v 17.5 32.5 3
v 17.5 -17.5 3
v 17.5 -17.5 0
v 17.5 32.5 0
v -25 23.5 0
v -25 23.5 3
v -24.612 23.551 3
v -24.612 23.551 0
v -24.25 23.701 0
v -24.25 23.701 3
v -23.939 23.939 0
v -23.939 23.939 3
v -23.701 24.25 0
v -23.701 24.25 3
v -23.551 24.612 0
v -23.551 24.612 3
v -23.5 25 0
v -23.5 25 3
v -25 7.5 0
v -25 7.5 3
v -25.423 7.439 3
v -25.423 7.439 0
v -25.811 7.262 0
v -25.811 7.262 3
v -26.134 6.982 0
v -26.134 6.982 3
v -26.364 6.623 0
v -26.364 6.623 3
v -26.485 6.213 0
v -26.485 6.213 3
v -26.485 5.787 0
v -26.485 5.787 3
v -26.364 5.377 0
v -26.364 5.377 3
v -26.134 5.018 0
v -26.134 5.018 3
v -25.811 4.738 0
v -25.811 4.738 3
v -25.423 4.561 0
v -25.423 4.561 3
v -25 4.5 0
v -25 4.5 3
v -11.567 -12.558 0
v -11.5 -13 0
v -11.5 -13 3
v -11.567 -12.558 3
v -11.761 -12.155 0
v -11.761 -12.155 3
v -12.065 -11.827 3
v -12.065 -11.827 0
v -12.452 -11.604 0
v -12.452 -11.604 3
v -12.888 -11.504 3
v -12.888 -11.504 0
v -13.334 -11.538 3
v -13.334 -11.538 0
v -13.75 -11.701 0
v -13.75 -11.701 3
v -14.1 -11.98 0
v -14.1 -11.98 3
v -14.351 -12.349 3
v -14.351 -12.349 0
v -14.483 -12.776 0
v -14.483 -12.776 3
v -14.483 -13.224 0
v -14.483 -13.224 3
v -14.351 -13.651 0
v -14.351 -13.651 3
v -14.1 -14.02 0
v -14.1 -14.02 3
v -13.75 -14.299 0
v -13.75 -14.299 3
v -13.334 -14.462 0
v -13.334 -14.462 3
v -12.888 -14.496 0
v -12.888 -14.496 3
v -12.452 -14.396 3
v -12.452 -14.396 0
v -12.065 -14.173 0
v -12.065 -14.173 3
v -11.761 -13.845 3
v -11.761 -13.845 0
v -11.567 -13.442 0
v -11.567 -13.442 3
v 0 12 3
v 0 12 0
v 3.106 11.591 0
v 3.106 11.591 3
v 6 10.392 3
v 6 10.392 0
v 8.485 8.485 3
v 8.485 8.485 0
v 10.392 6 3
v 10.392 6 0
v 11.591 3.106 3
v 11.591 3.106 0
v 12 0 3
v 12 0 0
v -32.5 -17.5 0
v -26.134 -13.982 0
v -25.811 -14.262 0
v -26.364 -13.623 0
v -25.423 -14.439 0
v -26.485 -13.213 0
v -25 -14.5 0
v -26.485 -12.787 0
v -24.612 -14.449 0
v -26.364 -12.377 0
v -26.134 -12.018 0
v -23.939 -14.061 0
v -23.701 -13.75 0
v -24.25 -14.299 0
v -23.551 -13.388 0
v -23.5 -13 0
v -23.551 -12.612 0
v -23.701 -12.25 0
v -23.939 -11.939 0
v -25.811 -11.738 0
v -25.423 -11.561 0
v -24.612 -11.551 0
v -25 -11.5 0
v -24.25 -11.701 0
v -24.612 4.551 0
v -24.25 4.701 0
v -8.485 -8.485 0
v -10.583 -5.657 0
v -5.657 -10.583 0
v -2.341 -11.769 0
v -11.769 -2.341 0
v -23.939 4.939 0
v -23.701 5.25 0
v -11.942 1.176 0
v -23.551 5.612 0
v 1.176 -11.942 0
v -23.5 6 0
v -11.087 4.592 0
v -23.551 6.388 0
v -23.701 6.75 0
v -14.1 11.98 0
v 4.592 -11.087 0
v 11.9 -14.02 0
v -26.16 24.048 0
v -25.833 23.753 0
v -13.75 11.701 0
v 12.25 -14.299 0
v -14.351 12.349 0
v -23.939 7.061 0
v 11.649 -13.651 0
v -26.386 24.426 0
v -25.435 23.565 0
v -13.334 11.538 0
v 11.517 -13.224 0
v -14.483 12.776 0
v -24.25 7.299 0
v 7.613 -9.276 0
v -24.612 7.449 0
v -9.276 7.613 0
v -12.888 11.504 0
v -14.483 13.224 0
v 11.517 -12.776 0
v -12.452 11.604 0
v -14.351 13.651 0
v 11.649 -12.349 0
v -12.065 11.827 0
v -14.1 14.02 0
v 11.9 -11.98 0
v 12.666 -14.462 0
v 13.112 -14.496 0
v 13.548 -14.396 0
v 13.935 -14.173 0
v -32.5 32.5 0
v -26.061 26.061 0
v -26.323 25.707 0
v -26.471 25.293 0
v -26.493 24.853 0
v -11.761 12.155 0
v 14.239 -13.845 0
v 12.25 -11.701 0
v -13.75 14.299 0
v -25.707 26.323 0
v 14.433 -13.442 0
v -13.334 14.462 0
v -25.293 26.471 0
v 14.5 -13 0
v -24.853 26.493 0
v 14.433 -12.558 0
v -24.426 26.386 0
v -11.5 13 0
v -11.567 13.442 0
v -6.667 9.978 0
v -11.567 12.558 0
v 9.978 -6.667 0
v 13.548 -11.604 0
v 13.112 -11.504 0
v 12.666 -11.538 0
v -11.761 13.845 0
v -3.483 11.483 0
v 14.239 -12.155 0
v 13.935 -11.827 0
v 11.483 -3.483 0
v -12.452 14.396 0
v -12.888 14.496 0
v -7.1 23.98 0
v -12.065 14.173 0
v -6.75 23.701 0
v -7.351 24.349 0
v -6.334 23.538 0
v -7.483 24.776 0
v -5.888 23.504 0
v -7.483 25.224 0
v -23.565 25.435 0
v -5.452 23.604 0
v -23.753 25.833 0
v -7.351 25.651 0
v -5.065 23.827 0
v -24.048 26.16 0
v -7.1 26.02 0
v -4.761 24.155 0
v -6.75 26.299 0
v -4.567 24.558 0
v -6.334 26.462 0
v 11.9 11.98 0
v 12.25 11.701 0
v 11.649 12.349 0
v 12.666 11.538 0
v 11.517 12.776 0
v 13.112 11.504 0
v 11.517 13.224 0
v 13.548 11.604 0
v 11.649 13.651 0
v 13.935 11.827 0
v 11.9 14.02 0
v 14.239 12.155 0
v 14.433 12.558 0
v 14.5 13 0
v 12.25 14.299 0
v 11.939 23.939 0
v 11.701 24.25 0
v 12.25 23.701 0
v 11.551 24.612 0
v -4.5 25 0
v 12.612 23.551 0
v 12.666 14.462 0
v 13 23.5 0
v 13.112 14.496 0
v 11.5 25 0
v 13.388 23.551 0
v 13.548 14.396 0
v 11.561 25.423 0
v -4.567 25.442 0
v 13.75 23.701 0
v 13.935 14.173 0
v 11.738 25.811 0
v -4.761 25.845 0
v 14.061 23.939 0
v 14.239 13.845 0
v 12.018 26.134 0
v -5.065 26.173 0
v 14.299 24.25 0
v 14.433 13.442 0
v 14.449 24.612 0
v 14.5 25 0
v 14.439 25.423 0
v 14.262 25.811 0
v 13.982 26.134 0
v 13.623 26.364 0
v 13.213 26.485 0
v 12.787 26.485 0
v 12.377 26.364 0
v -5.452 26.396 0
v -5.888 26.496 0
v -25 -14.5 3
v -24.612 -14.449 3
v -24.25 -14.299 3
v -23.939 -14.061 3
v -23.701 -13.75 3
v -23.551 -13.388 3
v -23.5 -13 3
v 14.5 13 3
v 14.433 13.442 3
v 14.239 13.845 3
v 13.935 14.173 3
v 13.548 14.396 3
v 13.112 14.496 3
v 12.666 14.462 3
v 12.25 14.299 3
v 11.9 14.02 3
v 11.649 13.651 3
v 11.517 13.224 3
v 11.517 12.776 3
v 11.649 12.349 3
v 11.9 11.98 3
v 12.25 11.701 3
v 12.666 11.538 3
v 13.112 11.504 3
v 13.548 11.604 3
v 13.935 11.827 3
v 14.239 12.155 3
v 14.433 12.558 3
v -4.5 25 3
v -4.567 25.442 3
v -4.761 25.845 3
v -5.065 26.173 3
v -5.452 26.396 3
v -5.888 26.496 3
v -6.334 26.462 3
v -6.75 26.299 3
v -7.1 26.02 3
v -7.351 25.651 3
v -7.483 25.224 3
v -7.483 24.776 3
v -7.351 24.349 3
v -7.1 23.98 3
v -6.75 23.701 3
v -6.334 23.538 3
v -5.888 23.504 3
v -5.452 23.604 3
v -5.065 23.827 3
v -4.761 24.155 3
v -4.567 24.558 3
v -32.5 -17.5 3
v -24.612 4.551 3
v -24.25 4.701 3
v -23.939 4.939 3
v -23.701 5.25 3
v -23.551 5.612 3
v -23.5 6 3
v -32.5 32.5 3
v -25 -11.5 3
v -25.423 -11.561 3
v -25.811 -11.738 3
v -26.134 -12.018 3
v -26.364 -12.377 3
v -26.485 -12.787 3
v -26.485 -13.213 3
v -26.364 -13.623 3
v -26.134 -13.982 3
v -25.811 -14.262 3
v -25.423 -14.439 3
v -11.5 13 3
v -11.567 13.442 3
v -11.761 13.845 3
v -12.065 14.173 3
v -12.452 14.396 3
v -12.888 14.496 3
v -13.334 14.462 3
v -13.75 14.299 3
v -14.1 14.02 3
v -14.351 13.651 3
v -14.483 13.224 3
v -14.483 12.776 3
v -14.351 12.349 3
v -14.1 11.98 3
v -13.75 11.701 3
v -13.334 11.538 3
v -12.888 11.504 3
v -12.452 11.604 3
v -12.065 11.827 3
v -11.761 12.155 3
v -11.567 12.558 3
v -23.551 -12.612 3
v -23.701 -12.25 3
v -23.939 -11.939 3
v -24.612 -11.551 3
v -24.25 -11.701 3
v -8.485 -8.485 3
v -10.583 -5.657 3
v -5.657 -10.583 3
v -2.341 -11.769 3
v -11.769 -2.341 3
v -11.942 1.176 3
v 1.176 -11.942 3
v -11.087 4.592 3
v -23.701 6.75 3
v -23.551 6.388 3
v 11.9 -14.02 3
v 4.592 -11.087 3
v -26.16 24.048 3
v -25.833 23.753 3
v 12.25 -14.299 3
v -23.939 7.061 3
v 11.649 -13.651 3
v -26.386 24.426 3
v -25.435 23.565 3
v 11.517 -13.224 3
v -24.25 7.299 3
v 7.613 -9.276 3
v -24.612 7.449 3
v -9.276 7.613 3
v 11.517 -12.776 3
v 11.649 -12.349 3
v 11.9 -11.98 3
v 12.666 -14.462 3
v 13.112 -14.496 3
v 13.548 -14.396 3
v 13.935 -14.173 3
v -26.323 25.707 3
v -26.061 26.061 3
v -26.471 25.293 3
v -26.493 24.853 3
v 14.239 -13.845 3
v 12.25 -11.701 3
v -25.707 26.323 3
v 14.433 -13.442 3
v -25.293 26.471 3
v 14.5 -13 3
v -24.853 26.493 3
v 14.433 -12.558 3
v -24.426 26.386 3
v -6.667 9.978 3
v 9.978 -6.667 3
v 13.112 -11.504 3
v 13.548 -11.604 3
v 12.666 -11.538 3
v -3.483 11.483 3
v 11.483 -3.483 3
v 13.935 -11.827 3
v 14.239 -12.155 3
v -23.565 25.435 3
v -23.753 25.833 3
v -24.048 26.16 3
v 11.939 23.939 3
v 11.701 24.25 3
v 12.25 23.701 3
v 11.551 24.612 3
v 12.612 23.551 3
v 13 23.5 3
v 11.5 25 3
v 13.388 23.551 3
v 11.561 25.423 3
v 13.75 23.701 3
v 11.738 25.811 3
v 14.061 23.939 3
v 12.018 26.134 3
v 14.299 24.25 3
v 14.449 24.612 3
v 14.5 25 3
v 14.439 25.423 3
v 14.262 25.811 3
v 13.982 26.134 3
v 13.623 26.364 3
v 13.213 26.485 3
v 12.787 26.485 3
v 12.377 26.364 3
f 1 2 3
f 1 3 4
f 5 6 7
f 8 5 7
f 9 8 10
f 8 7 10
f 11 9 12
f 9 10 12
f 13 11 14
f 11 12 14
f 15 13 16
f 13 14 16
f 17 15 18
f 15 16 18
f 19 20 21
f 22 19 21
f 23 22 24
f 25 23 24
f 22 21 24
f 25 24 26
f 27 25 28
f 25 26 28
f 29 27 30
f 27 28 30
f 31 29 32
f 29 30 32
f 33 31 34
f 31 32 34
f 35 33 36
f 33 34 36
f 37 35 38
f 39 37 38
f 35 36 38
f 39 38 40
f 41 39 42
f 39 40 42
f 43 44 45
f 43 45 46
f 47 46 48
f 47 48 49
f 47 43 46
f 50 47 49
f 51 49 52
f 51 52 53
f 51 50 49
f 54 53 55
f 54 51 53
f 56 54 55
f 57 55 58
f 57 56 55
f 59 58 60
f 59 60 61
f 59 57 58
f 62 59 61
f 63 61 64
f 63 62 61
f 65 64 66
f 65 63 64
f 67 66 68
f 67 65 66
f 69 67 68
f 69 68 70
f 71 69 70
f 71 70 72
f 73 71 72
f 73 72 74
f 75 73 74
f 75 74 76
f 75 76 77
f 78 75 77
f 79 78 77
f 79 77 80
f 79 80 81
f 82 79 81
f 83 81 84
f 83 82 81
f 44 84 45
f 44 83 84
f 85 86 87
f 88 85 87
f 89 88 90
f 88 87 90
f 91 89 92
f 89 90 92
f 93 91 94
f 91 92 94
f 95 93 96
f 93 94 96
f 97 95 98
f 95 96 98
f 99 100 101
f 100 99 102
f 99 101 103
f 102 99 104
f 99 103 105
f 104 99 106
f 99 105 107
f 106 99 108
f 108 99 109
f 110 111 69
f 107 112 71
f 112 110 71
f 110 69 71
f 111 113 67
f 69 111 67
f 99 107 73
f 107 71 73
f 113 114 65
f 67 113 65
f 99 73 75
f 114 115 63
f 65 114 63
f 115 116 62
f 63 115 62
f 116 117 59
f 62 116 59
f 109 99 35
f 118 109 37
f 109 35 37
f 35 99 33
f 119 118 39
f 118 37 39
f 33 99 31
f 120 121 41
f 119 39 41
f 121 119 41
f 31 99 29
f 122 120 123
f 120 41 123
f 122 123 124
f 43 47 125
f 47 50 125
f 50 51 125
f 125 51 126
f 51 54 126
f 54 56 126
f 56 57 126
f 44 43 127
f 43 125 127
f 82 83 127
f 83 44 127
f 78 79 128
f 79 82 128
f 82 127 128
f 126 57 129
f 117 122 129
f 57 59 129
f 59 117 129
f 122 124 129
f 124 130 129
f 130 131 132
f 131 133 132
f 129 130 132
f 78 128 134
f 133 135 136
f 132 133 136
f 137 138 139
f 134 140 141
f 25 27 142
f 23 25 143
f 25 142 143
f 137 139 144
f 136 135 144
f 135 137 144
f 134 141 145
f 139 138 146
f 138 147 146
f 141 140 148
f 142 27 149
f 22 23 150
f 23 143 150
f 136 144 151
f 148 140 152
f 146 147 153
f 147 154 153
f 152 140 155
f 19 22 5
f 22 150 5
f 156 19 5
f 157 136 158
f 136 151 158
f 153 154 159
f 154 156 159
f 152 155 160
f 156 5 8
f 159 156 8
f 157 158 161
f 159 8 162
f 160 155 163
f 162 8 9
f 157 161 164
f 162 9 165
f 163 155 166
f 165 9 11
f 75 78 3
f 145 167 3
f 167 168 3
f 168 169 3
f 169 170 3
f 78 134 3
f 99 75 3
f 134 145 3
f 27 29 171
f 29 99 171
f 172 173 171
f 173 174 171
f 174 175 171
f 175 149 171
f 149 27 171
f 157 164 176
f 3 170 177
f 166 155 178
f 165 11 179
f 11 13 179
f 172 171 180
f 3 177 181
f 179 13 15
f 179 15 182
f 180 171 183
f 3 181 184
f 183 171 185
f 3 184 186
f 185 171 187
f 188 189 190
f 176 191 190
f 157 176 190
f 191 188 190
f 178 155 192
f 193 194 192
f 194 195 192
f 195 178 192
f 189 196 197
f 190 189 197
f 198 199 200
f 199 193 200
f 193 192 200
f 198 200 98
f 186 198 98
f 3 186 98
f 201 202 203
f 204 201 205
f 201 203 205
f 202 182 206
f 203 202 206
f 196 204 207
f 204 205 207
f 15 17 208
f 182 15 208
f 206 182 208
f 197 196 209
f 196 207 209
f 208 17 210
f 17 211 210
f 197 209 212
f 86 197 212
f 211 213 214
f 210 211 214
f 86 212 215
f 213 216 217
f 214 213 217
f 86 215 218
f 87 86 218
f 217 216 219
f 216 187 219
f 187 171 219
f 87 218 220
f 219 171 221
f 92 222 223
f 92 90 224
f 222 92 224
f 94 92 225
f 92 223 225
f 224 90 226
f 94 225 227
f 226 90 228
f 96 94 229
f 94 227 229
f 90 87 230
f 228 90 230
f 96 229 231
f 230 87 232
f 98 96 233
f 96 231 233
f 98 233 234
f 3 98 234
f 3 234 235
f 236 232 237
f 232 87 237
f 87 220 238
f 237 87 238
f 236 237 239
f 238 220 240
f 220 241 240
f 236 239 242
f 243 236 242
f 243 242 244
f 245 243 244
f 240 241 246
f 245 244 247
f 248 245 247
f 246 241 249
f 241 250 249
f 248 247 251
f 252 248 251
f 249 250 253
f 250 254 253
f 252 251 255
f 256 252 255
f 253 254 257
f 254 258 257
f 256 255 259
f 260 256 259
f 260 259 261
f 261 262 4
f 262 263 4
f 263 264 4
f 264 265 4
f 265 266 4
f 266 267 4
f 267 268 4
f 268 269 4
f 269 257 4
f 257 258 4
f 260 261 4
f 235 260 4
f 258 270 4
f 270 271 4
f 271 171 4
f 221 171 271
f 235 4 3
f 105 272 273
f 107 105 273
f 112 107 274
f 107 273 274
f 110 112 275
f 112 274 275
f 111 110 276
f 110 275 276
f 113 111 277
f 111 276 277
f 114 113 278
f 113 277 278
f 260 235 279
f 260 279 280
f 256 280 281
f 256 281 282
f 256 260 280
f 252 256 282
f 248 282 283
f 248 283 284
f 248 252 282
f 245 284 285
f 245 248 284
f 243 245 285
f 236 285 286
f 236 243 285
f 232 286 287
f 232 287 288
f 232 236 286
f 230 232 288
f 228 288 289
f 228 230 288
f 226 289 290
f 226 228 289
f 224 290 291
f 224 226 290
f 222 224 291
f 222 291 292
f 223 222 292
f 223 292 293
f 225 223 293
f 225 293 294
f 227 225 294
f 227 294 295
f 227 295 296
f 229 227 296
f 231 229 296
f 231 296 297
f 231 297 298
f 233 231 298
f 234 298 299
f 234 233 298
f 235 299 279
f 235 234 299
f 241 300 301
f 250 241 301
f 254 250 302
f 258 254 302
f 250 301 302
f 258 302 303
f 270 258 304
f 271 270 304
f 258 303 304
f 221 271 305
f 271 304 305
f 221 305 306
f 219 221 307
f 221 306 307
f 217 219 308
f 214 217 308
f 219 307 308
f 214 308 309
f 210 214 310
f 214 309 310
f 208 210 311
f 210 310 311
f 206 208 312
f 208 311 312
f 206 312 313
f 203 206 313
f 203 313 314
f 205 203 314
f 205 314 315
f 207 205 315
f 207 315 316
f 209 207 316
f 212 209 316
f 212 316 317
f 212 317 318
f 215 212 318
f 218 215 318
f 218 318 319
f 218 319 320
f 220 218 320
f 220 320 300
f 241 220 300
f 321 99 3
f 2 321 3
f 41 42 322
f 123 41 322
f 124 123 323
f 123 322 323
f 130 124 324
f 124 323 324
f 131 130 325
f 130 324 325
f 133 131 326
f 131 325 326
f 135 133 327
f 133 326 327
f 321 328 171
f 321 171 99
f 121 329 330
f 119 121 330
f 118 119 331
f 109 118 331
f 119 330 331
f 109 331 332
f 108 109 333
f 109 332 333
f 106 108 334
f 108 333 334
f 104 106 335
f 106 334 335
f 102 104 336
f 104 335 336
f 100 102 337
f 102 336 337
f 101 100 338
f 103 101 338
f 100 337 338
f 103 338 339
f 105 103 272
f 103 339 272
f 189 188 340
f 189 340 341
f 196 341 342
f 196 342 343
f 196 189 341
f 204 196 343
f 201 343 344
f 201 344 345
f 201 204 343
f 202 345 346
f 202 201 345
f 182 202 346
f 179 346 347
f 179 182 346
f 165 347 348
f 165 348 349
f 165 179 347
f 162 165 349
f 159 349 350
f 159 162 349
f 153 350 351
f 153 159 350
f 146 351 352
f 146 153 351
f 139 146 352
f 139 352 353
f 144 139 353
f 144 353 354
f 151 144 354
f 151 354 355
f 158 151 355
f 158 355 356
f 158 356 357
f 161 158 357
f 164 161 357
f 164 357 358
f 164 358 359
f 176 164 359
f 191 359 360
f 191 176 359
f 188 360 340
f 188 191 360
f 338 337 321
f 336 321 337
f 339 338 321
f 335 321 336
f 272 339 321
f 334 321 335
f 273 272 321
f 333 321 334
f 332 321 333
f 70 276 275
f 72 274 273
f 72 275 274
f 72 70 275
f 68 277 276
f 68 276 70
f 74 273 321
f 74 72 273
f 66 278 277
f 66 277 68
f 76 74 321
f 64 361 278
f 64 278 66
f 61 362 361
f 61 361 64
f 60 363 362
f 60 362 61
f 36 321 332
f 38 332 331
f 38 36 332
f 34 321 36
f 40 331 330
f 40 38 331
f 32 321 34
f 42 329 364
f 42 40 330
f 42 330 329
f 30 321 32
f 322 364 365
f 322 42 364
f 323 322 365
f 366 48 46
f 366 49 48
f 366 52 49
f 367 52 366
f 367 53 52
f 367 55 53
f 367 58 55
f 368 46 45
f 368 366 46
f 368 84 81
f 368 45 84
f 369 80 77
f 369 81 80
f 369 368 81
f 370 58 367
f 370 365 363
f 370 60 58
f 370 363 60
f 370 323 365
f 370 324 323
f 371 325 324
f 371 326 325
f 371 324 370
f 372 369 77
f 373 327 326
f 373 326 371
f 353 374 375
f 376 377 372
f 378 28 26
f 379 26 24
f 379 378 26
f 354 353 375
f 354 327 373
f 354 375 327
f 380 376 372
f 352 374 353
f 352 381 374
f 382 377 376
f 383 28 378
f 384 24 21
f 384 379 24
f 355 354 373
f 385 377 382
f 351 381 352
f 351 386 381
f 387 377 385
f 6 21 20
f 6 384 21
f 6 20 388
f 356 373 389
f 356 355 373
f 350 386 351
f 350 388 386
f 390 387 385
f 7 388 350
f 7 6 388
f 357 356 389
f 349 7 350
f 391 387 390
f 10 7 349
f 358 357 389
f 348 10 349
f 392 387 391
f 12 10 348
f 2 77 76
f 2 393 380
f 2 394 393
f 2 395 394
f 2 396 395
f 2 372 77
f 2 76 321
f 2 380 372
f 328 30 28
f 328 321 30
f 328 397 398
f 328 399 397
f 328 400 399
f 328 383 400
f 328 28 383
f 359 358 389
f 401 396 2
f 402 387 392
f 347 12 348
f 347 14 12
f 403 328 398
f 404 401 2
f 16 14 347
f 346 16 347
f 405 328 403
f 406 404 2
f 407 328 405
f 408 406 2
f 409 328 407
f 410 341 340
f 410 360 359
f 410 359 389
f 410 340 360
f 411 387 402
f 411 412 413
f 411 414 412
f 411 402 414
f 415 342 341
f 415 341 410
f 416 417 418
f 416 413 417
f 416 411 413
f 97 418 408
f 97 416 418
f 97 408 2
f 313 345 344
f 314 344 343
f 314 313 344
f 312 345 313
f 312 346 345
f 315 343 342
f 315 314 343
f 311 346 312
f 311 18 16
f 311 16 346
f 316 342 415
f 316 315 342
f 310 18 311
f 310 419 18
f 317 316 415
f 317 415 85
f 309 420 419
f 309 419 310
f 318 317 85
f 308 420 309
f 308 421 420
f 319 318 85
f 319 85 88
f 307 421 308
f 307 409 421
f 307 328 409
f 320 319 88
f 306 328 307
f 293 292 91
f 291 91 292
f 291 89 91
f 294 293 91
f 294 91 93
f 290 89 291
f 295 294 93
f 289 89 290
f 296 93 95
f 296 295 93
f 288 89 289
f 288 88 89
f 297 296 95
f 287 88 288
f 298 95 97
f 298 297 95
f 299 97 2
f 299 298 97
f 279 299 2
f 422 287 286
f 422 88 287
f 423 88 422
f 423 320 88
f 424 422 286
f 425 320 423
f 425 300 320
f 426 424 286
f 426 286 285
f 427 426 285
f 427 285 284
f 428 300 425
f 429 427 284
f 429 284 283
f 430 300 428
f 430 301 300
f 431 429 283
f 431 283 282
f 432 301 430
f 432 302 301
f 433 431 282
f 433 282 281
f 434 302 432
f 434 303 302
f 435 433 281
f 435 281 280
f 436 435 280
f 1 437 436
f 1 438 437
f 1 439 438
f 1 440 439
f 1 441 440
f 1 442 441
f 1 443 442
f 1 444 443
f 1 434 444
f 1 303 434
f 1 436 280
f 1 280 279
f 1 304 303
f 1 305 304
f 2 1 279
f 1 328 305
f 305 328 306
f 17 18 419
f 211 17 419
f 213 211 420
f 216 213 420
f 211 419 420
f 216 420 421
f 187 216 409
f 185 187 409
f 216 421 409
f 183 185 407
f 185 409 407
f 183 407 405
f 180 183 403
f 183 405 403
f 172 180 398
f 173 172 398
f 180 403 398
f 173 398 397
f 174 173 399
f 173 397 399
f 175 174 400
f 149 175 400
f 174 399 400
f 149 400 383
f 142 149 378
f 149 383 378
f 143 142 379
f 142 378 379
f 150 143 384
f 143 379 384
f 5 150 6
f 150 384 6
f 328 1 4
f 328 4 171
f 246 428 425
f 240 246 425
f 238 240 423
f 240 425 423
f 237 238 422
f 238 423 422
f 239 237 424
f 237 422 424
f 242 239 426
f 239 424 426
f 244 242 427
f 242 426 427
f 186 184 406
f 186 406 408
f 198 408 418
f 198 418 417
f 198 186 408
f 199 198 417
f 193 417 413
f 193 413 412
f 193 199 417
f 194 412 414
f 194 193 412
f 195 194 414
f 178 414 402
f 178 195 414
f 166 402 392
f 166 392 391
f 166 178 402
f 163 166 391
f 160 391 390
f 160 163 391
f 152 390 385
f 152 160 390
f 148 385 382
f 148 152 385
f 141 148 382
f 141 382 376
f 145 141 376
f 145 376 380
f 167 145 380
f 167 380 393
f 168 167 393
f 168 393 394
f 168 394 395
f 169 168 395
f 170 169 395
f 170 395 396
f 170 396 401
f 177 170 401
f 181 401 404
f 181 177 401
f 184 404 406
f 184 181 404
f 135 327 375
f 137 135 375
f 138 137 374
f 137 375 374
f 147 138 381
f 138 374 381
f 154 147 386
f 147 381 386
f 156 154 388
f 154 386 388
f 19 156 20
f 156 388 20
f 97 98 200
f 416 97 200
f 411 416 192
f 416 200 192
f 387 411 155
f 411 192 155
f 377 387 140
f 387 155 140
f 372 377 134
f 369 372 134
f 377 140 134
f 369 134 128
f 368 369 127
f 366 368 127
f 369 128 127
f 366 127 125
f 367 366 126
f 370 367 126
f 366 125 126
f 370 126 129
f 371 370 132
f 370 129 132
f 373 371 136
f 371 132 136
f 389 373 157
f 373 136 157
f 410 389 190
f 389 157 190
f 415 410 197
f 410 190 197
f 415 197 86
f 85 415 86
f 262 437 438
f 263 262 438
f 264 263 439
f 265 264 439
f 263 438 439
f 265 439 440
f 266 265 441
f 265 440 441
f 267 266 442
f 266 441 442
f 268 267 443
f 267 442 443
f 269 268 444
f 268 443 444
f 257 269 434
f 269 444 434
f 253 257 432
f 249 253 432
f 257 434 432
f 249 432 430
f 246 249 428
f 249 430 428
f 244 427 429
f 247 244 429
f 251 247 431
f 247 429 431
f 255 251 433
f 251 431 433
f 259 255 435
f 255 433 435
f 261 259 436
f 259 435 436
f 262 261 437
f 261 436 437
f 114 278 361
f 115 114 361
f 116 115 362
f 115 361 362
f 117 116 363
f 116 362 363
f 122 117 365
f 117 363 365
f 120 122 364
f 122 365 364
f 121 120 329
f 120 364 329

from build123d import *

# Parameters (mm, degrees)
F0_W     = 35
F0_H     = 35
F0_R     = 1.5
F1_DEPTH = 3
F3_DEPTH = 3
F5_DEPTH = 25


with BuildPart() as f1:
    # F0 (on Top) → F1 (new body)
    with BuildSketch(Plane.XY):
        Rectangle(F0_W, F0_H)
        with Locations((-13, -13)):
            Circle(F0_R, mode=Mode.SUBTRACT)
        with Locations((13, -13)):
            Circle(F0_R, mode=Mode.SUBTRACT)
        with Locations((-13, 13)):
            Circle(F0_R, mode=Mode.SUBTRACT)
        with BuildLine():
            ThreePointArc((0, 12), (8.485281, 8.485281), (12, 0))
            ThreePointArc((12, 0), (-8.485281, -8.485281), (0, 12))
        make_face(mode=Mode.SUBTRACT)
        with Locations((13, 13)):
            Circle(F0_R, mode=Mode.SUBTRACT)
    extrude(amount=F1_DEPTH)

    # F2 (on face) → F3 (join)
    with BuildSketch(Plane.XY.offset(3)):
        Polygon((17.5, 17.5), (17.5, 32.5), (-32.5, 32.5), (-32.5, -17.5), (-17.5, -17.5), (-17.5, 17.5), align=None)
    extrude(amount=-F3_DEPTH)

    # F4 (on face) → F5 (cut)
    with BuildSketch(Plane.XY.offset(3)):
        with BuildLine():
            ThreePointArc((13, 23.5), (14.06066, 23.93934), (14.5, 25))
            Line((14.5, 25), (13, 25))
            Line((13, 25), (13, 23.5))
        make_face()
        with BuildLine():
            Line((13, 25), (14.5, 25))
            ThreePointArc((14.5, 25), (13, 26.5), (11.5, 25))
            Line((11.5, 25), (13, 25))
        make_face()
        with BuildLine():
            ThreePointArc((-23.5, -13), (-23.93934, -11.93934), (-25, -11.5))
            Line((-25, -11.5), (-25, -13))
            Line((-25, -13), (-23.5, -13))
        make_face()
        with BuildLine():
            Line((-25, -13), (-25, -11.5))
            ThreePointArc((-25, -11.5), (-26.5, -13), (-25, -14.5))
            Line((-25, -14.5), (-25, -13))
        make_face()
        with BuildLine():
            ThreePointArc((-23.5, 6), (-23.93934, 7.06066), (-25, 7.5))
            Line((-25, 7.5), (-25, 4.5))
            ThreePointArc((-25, 4.5), (-23.93934, 4.93934), (-23.5, 6))
        make_face()
        with BuildLine():
            Line((-25, 4.5), (-25, 7.5))
            ThreePointArc((-25, 7.5), (-26.5, 6), (-25, 4.5))
        make_face()
        with BuildLine():
            ThreePointArc((-25, 23.5), (-23.93934, 23.93934), (-23.5, 25))
            Line((-23.5, 25), (-25, 25))
            Line((-25, 25), (-25, 23.5))
        make_face()
        with BuildLine():
            Line((-25, 25), (-23.5, 25))
            ThreePointArc((-23.5, 25), (-26.06066, 26.06066), (-25, 23.5))
            Line((-25, 23.5), (-25, 25))
        make_face()
        with BuildLine():
            ThreePointArc((-7.5, 25), (-6, 23.5), (-4.5, 25))
            Line((-4.5, 25), (-7.5, 25))
        make_face()
        with BuildLine():
            Line((-7.5, 25), (-4.5, 25))
            ThreePointArc((-4.5, 25), (-6, 26.5), (-7.5, 25))
        make_face()
        with BuildLine():
            Line((13, 23.5), (13, 25))
            Line((13, 25), (11.5, 25))
            ThreePointArc((11.5, 25), (11.93934, 23.93934), (13, 23.5))
        make_face()
        with BuildLine():
            Line((-23.5, -13), (-25, -13))
            Line((-25, -13), (-25, -14.5))
            ThreePointArc((-25, -14.5), (-23.93934, -14.06066), (-23.5, -13))
        make_face()
    extrude(amount=-F5_DEPTH, mode=Mode.SUBTRACT)


solid = f1.part
